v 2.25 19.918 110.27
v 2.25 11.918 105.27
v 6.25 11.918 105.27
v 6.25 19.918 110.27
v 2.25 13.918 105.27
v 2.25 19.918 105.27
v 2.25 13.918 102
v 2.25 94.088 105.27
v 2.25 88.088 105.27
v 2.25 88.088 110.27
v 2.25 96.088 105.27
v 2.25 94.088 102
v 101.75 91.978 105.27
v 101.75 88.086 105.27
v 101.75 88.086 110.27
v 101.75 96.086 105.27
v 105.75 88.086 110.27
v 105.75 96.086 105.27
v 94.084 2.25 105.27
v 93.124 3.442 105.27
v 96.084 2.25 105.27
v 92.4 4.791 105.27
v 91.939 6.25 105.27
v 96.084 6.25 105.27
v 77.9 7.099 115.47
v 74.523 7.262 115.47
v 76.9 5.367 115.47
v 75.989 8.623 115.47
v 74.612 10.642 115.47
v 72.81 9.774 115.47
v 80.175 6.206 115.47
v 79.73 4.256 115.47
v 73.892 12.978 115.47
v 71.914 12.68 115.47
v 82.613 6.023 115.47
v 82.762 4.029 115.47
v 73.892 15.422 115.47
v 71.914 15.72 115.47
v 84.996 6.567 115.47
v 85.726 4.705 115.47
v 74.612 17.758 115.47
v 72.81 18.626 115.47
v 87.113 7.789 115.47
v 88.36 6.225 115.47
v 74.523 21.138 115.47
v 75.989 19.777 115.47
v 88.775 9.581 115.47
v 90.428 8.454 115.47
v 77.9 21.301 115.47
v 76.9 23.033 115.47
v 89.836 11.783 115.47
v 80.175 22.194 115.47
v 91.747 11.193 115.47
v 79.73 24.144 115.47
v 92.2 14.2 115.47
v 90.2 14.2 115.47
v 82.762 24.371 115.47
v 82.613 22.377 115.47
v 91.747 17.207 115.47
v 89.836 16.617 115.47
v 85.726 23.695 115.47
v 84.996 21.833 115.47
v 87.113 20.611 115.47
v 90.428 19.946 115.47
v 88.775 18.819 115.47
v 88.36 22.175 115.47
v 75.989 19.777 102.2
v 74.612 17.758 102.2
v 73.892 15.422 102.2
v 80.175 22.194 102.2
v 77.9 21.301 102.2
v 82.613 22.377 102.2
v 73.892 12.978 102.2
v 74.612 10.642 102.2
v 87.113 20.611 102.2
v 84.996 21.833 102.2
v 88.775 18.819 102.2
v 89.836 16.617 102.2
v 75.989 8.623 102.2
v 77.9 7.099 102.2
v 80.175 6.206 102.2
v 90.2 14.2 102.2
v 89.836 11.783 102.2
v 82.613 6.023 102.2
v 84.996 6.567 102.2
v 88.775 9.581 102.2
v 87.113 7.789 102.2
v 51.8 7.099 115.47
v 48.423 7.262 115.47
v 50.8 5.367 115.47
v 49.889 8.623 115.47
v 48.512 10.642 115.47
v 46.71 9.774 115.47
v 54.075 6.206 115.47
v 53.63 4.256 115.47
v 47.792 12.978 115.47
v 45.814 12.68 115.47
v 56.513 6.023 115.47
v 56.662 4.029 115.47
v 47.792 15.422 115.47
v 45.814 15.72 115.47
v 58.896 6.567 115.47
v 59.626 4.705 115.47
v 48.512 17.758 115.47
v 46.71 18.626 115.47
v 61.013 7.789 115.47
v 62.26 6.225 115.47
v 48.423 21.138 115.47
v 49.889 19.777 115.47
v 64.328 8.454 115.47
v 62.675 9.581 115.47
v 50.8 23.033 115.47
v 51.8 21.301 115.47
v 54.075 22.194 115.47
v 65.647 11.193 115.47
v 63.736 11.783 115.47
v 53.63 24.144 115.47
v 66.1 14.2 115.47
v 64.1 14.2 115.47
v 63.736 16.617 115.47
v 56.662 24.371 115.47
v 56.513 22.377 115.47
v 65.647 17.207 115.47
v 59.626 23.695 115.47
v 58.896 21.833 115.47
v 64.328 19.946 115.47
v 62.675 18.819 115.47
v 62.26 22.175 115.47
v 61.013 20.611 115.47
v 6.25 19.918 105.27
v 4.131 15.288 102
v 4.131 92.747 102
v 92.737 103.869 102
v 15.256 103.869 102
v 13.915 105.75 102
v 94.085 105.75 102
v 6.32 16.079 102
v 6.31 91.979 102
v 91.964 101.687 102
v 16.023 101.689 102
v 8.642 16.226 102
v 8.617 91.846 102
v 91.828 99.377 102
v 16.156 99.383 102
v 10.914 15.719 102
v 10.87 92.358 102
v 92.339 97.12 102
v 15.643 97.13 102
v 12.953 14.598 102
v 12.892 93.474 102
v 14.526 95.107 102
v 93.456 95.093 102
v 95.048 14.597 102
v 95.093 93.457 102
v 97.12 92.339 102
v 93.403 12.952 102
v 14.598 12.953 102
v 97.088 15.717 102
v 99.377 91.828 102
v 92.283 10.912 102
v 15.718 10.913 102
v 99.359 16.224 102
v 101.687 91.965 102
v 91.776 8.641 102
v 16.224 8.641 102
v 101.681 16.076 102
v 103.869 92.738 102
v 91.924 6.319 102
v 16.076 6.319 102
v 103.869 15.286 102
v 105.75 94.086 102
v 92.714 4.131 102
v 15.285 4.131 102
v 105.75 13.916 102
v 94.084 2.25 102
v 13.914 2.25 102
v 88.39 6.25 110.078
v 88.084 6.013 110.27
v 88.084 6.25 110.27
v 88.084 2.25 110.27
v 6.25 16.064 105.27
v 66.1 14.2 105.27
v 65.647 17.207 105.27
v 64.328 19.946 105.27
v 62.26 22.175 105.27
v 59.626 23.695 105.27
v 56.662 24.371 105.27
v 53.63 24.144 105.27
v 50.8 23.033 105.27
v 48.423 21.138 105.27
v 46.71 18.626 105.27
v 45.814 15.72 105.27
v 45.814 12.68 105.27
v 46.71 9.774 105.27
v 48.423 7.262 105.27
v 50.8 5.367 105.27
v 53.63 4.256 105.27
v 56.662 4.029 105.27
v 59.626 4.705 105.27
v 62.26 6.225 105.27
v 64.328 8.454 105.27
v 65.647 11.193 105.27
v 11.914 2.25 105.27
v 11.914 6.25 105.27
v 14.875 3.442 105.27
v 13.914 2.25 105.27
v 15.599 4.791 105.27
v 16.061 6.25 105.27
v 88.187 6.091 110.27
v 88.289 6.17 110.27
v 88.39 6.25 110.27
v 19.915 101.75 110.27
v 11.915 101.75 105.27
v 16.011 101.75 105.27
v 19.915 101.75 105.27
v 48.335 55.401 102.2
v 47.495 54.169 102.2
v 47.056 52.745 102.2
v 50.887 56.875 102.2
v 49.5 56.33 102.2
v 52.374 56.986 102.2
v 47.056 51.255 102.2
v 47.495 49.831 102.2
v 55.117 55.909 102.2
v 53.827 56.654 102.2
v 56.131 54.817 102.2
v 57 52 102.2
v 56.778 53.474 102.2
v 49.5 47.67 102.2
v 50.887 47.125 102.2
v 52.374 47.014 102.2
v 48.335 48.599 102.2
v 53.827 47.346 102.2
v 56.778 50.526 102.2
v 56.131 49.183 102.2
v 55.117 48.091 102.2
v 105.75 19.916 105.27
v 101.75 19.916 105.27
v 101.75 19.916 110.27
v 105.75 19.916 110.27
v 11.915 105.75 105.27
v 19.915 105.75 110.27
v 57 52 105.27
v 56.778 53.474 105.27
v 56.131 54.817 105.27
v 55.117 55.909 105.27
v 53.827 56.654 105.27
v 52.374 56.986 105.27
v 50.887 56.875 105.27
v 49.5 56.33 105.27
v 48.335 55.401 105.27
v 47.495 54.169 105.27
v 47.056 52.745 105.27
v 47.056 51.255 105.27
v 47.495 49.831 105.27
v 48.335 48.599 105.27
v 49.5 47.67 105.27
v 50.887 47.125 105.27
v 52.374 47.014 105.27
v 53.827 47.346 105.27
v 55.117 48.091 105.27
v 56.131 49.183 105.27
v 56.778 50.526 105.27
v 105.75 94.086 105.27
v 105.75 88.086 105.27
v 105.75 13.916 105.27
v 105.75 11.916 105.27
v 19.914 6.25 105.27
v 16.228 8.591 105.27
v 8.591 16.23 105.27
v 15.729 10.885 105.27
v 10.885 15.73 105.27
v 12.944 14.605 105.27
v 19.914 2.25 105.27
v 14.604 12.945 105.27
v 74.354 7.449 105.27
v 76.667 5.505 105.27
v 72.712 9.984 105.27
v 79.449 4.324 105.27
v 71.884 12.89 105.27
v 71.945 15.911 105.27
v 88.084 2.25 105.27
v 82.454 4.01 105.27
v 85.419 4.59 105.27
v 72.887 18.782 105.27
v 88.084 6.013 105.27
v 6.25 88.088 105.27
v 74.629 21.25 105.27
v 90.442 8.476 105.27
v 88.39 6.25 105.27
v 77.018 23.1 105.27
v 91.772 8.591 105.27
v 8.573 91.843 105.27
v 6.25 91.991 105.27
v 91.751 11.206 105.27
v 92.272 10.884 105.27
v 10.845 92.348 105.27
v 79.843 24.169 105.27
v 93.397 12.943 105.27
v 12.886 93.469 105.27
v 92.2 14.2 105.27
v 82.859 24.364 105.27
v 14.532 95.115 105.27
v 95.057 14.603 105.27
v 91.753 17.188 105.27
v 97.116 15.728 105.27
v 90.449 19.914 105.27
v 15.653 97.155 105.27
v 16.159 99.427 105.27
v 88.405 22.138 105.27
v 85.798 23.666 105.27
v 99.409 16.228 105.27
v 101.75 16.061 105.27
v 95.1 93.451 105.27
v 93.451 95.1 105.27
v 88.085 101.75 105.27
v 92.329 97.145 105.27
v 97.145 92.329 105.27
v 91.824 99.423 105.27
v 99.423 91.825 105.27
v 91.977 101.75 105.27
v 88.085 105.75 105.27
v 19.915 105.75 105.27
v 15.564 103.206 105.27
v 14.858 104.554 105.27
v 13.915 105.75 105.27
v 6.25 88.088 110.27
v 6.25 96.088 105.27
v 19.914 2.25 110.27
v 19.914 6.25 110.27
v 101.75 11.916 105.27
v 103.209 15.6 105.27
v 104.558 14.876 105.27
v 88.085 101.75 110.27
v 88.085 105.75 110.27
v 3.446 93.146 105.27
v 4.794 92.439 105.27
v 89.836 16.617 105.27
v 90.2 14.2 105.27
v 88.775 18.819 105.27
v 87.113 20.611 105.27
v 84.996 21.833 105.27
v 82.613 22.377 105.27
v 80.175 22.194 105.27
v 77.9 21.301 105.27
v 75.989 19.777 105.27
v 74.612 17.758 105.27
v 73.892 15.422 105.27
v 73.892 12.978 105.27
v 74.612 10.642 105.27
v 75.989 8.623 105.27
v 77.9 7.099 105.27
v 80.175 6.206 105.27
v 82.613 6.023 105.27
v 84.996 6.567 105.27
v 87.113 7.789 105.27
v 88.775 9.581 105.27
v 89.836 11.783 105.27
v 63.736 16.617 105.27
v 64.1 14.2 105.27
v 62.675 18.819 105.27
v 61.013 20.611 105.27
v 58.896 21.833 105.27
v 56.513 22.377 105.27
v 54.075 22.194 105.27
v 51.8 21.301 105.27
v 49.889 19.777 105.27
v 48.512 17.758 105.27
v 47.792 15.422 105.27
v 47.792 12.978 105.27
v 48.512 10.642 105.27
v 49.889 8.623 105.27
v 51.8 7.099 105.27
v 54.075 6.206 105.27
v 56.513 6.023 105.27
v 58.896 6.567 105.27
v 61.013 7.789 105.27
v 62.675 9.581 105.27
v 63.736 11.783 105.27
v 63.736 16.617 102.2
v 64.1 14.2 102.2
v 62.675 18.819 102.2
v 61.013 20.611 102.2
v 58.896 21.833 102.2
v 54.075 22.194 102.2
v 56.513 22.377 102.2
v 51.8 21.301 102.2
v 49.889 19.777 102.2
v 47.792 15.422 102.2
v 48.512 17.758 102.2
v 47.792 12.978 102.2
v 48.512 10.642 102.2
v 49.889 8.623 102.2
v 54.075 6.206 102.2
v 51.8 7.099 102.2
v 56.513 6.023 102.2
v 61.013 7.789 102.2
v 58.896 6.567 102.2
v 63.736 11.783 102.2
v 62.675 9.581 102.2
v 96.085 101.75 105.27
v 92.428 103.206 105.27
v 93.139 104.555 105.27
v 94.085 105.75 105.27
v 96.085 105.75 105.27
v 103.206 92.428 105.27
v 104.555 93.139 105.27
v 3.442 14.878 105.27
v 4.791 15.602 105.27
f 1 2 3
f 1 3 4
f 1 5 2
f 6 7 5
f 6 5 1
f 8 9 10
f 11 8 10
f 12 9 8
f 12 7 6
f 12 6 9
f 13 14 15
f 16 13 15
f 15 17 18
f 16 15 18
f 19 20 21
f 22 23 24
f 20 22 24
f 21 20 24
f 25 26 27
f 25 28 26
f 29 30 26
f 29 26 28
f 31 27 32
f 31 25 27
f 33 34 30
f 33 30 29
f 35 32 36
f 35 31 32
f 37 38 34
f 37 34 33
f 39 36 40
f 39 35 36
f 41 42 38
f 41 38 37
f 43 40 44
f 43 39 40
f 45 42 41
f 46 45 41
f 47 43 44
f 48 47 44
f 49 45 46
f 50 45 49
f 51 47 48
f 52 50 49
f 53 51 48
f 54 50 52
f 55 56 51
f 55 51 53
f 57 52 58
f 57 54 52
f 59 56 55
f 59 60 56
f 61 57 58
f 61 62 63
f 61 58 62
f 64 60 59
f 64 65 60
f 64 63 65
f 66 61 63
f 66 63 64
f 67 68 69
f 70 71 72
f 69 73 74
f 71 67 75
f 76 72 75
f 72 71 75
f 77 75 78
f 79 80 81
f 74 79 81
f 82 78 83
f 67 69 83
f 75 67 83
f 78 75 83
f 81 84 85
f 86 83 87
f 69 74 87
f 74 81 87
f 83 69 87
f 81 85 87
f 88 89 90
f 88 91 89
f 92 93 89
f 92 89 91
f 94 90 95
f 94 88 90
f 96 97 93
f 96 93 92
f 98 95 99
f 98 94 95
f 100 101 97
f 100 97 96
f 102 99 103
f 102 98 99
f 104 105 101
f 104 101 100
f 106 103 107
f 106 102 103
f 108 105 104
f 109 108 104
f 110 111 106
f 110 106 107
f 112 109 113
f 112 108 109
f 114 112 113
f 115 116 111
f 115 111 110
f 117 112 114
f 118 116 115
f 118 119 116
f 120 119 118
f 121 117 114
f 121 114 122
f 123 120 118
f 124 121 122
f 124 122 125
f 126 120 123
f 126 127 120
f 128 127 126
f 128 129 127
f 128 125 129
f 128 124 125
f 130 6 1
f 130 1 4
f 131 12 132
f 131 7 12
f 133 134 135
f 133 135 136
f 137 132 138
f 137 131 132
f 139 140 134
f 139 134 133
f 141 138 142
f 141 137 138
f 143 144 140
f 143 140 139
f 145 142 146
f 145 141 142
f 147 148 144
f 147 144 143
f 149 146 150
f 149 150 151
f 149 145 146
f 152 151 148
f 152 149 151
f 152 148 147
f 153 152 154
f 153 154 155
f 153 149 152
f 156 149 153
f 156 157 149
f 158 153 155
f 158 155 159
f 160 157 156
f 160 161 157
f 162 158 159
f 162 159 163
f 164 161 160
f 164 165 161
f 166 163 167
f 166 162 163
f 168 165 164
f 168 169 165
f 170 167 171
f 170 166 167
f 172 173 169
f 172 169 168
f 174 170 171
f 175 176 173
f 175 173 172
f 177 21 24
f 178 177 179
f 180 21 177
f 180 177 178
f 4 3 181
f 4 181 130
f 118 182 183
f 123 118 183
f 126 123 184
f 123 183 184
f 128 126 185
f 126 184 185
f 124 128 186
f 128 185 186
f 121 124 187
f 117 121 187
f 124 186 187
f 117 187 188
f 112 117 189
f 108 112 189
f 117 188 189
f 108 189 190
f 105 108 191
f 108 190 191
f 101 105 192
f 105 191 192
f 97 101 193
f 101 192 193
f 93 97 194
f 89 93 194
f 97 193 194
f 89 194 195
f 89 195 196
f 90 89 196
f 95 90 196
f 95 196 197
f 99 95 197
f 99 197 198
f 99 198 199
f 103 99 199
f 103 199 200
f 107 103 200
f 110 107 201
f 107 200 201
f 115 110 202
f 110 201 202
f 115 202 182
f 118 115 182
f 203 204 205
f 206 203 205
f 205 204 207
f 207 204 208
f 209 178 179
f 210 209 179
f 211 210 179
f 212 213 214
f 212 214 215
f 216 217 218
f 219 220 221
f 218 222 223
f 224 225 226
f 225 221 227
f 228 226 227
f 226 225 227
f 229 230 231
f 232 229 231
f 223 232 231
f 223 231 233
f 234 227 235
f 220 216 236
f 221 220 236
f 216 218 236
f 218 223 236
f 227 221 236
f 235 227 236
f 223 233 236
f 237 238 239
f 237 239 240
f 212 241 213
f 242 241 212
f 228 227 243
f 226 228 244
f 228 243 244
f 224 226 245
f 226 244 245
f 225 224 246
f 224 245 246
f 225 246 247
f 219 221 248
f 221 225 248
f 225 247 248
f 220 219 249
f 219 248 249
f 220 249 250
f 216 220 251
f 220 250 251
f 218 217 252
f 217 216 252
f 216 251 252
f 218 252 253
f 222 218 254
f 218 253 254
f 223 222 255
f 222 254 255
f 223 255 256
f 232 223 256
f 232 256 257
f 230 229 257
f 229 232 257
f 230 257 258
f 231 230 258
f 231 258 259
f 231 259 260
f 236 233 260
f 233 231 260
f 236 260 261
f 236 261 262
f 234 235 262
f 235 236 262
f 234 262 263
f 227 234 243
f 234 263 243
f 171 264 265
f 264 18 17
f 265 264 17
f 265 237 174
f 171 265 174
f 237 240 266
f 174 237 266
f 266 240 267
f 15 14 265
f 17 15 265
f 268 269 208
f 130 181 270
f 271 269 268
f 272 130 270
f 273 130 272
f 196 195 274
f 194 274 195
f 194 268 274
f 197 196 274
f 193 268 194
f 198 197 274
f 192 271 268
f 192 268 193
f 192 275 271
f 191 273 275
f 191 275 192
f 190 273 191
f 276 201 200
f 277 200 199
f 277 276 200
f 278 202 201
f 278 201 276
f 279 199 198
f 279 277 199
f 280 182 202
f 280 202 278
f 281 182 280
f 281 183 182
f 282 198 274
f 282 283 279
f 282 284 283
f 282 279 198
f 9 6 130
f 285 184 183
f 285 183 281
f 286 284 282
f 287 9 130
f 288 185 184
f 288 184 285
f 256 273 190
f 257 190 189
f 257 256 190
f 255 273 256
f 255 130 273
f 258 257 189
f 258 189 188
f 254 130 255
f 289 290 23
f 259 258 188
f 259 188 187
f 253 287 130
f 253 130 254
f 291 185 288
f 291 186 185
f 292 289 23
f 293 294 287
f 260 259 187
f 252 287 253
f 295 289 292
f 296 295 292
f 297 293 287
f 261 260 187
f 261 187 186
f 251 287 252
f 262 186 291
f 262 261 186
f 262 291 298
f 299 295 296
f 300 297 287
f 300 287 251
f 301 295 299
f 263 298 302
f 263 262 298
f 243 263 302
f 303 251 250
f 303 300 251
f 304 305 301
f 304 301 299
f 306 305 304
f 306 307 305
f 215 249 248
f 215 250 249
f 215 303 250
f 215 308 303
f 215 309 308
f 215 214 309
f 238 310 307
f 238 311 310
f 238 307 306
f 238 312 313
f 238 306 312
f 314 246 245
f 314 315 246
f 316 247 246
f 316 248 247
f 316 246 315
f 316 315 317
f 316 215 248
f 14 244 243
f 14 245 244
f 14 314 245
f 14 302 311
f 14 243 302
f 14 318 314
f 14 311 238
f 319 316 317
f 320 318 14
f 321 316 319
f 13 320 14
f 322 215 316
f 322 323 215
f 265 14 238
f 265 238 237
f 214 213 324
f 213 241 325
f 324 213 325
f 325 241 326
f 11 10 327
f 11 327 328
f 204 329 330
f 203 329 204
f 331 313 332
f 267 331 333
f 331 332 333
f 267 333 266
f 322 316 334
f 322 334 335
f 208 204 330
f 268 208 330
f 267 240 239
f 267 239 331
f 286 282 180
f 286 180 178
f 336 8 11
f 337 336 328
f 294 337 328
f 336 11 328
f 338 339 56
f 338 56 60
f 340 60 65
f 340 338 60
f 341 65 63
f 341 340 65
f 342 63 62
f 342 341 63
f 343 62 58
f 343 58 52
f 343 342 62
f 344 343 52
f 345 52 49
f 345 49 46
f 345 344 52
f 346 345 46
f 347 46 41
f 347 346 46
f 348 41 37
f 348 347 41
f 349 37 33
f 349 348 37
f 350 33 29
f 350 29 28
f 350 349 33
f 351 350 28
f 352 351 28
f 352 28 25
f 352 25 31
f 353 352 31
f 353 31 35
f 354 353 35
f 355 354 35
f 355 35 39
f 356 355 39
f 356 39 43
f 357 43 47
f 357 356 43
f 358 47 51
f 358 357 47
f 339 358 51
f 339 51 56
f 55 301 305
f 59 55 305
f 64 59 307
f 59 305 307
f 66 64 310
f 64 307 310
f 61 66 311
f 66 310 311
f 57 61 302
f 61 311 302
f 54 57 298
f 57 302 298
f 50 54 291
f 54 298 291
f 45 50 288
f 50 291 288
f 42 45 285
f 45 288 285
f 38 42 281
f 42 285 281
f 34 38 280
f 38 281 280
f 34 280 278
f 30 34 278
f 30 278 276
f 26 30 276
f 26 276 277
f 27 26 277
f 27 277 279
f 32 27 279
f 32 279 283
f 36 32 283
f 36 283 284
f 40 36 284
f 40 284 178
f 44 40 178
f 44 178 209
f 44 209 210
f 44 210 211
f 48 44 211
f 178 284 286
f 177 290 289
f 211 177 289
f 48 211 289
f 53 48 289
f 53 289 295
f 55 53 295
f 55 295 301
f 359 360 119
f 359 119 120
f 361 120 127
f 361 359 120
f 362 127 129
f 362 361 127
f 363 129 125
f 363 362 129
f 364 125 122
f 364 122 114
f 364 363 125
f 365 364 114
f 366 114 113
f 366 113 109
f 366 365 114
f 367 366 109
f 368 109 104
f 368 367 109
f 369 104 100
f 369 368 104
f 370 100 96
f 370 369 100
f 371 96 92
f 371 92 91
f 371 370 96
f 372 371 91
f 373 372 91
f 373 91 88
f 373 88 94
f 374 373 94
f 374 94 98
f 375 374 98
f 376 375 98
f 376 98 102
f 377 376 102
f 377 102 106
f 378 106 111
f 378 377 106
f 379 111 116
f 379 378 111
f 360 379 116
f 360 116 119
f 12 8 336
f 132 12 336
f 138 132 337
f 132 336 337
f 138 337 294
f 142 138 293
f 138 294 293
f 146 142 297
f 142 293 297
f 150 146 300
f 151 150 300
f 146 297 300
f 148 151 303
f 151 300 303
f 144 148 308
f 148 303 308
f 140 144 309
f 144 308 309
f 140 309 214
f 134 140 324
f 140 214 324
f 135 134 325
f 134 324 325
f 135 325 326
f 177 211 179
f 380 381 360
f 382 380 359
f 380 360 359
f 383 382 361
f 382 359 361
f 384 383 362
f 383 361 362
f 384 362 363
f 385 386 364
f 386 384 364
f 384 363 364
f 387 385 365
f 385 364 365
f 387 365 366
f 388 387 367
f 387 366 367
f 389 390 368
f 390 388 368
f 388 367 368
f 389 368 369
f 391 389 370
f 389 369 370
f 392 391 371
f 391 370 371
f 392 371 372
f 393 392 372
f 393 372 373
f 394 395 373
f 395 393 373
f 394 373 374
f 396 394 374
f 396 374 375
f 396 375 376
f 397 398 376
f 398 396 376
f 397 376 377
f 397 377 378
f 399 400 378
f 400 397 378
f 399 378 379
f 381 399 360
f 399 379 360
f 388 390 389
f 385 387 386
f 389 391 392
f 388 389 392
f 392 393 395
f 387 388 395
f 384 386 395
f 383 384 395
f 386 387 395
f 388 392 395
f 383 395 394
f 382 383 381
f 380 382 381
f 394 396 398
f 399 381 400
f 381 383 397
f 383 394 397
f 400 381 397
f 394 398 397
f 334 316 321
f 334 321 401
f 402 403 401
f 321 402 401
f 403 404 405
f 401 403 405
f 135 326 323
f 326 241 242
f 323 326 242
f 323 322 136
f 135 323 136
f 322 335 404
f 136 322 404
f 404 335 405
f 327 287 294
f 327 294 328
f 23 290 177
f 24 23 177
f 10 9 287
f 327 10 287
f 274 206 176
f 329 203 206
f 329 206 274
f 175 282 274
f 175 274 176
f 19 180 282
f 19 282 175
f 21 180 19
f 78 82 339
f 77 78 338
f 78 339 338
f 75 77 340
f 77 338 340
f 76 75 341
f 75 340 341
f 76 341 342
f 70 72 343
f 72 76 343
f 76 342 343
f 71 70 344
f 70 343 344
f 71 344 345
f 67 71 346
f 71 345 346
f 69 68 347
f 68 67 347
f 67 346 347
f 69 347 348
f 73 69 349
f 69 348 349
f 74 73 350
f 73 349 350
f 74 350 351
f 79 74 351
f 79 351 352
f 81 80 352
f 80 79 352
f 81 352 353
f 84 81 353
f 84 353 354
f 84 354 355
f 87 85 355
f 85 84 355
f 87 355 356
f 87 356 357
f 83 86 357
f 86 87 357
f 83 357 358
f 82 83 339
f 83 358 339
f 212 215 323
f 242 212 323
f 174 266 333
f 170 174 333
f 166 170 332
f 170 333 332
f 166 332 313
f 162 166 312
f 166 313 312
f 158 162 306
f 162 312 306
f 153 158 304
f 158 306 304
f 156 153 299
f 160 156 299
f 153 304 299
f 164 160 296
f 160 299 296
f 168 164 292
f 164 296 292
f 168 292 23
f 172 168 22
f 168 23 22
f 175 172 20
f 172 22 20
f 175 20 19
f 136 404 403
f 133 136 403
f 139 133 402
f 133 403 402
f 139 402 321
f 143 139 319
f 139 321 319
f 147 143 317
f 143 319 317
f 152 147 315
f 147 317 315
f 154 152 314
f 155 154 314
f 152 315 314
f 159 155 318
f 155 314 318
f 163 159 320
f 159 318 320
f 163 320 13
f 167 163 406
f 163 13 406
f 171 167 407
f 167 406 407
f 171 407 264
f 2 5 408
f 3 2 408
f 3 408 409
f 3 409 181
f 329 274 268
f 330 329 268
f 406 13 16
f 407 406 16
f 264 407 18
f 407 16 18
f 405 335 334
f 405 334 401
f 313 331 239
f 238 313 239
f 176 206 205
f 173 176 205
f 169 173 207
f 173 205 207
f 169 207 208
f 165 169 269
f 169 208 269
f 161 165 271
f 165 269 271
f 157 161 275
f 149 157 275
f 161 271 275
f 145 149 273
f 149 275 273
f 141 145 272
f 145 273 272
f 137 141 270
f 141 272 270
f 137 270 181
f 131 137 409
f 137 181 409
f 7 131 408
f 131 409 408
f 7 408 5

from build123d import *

# Parameters (mm, degrees)
SKETCH108_W     = 108
SKETCH108_H     = 108
PAD045_DEPTH    = 3.27
FILLET007_R     = 8
SKETCH_R        = 8.2
POCKET_DEPTH    = 3.271
SKETCH131_R     = 10.2
SKETCH131_R_2   = 8.2
PAD_DEPTH       = 10.2
SKETCH132_W     = 108
SKETCH132_H     = 108
POCKET052_DEPTH = 3.271
SKETCH133_R     = 5
POCKET053_DEPTH = 3.271
SKETCH134_W     = 4
SKETCH134_H     = 8
SKETCH134_W_2   = 8
SKETCH134_H_2   = 4
PAD052_DEPTH    = 5
POCKET054_DEPTH = 4
POCKET055_DEPTH = 4
POCKET056_DEPTH = 4
POCKET057_DEPTH = 4
SKETCH139_R     = 8.2
SKETCH139_R_2   = 5
PAD053_DEPTH    = 0.2


with BuildPart() as part:
    # Sketch108 → Pad045 (new body)
    with BuildSketch(Plane.XY):
        with Locations((54, 54)):
            Rectangle(SKETCH108_W, SKETCH108_H)
    extrude(amount=PAD045_DEPTH)

    # Fillet007
    fillet007_edges = [part.edges().sort_by_distance(p)[0] for p in [
        (0, 0, 1.635),
        (0, 108, 1.635),
        (108, 108, 1.635),
        (108, 0, 1.635),
    ]]
    fillet(fillet007_edges, radius=FILLET007_R)

    # Sketch (on Face5 of Fillet007) → Pocket (cut, through all)
    with BuildSketch(Plane.XY.offset(3.27)):
        with Locations((55.9, 14.2)):
            Circle(SKETCH_R)
        with Locations((82, 14.2)):
            Circle(SKETCH_R)
    extrude(amount=-POCKET_DEPTH, mode=Mode.SUBTRACT)

    # Sketch131 (on Face5 of Pocket) → Pad (join)
    with BuildSketch(Plane.XY.offset(3.27)):
        with Locations((55.9, 14.2)):
            Circle(SKETCH131_R)
        with Locations((55.9, 14.2)):
            Circle(SKETCH131_R_2, mode=Mode.SUBTRACT)
        with Locations((82, 14.2)):
            Circle(SKETCH131_R)
        with Locations((82, 14.2)):
            Circle(SKETCH131_R_2, mode=Mode.SUBTRACT)
    extrude(amount=PAD_DEPTH)

    # Sketch132 (on Face5 of Pad) → Pocket052 (cut, through all)
    with BuildSketch(Plane.XY.offset(3.27)):
        with Locations((54, 54)):
            Rectangle(SKETCH132_W, SKETCH132_H)
        with BuildLine():
            Line((2.25, 94.088366), (2.25, 13.918289))
            ThreePointArc((13.91388, 2.25), (13.833782, 13.833813), (2.25, 13.918289))
            Line((13.91388, 2.25), (94.083957, 2.25))
            ThreePointArc((105.75, 13.916052), (94.167504, 13.832496), (94.083957, 2.25))
            Line((105.75, 94.086129), (105.75, 13.916052))
            ThreePointArc((94.085398, 105.75), (94.217085, 94.217093), (105.75, 94.086129))
            Line((13.915321, 105.75), (94.085398, 105.75))
            ThreePointArc((2.25, 94.088366), (13.766826, 94.233221), (13.915321, 105.75))
        make_face(mode=Mode.SUBTRACT)
    extrude(amount=-POCKET052_DEPTH, mode=Mode.SUBTRACT)

    # Sketch133 (on Face1 of Pocket052) → Pocket053 (cut, through all)
    with BuildSketch(Plane.XY.offset(3.27)):
        with Locations((52, 52)):
            Circle(SKETCH133_R)
    extrude(amount=-POCKET053_DEPTH, mode=Mode.SUBTRACT)

    # Sketch134 (on Face1 of Pocket053) → Pad052 (join)
    with BuildSketch(Plane.XY.offset(3.27)):
        with Locations((4.25, 92.088366)):
            Rectangle(SKETCH134_W, SKETCH134_H)
        with Locations((15.915321, 103.75)):
            Rectangle(SKETCH134_W_2, SKETCH134_H_2)
        with Locations((92.085398, 103.75)):
            Rectangle(SKETCH134_W_2, SKETCH134_H_2)
        with Locations((103.75, 92.086129)):
            Rectangle(SKETCH134_W, SKETCH134_H)
        with Locations((103.75, 15.916052)):
            Rectangle(SKETCH134_W, SKETCH134_H)
        with Locations((92.083957, 4.25)):
            Rectangle(SKETCH134_W_2, SKETCH134_H_2)
        with Locations((15.91388, 4.25)):
            Rectangle(SKETCH134_W_2, SKETCH134_H_2)
        with Locations((4.25, 15.918289)):
            Rectangle(SKETCH134_W, SKETCH134_H)
    extrude(amount=PAD052_DEPTH)

    # Sketch135 (on Face24 of Pad052) → Pocket054 (cut)
    with BuildSketch(Plane.YZ.offset(105.75)):
        Polygon((96.086129, 8.27), (88.086129, 8.27), (96.086129, 3.27), align=None)
        Polygon((11.916052, 8.27), (19.916052, 8.27), (11.916052, 3.27), align=None)
    extrude(amount=-POCKET054_DEPTH, mode=Mode.SUBTRACT)

    # Sketch136 (on Face27 of Pocket054) → Pocket055 (cut)
    with BuildSketch(Plane(origin=(0, 105.75, 0), x_dir=(-1, 0, 0), z_dir=(0, 1, 0))):
        Polygon((-96.085398, 8.27), (-88.085398, 8.27), (-96.085398, 3.27), align=None)
        Polygon((-19.915321, 8.27), (-11.915321, 8.27), (-11.915321, 3.27), align=None)
    extrude(amount=-POCKET055_DEPTH, mode=Mode.SUBTRACT)

    # Sketch137 (on Face18 of Pocket055) → Pocket056 (cut)
    with BuildSketch(Plane(origin=(2.25, 0, 0), x_dir=(0, -1, 0), z_dir=(-1, 0, 0))):
        Polygon((-96.088366, 8.27), (-88.088366, 8.27), (-96.088366, 3.27), align=None)
        Polygon((-19.918289, 8.27), (-11.918289, 8.27), (-11.918289, 3.27), align=None)
    extrude(amount=-POCKET056_DEPTH, mode=Mode.SUBTRACT)

    # Sketch138 (on Face17 of Pocket056) → Pocket057 (cut)
    with BuildSketch(Plane.XZ.offset(-2.25)):
        Polygon((11.91388, 8.27), (19.91388, 8.27), (11.91388, 3.27), align=None)
        Polygon((88.083957, 8.27), (96.083957, 8.27), (96.083957, 3.27), align=None)
    extrude(amount=-POCKET057_DEPTH, mode=Mode.SUBTRACT)

    # Sketch139 (on Face1 of Pocket057) → Pad053 (join)
    with BuildSketch(Plane(origin=(0, 0, 0), x_dir=(1, 0, 0), z_dir=(0, 0, -1))):
        with Locations((55.9, -14.2)):
            Circle(SKETCH139_R)
        with Locations((82, -14.2)):
            Circle(SKETCH139_R)
        with Locations((52, -52)):
            Circle(SKETCH139_R_2)
    extrude(amount=-PAD053_DEPTH)


with BuildPart() as part_1:
    # Body020 placement: moved
    add(part.part.moved(Location((0, 0, 102))))


solid = part_1.part
